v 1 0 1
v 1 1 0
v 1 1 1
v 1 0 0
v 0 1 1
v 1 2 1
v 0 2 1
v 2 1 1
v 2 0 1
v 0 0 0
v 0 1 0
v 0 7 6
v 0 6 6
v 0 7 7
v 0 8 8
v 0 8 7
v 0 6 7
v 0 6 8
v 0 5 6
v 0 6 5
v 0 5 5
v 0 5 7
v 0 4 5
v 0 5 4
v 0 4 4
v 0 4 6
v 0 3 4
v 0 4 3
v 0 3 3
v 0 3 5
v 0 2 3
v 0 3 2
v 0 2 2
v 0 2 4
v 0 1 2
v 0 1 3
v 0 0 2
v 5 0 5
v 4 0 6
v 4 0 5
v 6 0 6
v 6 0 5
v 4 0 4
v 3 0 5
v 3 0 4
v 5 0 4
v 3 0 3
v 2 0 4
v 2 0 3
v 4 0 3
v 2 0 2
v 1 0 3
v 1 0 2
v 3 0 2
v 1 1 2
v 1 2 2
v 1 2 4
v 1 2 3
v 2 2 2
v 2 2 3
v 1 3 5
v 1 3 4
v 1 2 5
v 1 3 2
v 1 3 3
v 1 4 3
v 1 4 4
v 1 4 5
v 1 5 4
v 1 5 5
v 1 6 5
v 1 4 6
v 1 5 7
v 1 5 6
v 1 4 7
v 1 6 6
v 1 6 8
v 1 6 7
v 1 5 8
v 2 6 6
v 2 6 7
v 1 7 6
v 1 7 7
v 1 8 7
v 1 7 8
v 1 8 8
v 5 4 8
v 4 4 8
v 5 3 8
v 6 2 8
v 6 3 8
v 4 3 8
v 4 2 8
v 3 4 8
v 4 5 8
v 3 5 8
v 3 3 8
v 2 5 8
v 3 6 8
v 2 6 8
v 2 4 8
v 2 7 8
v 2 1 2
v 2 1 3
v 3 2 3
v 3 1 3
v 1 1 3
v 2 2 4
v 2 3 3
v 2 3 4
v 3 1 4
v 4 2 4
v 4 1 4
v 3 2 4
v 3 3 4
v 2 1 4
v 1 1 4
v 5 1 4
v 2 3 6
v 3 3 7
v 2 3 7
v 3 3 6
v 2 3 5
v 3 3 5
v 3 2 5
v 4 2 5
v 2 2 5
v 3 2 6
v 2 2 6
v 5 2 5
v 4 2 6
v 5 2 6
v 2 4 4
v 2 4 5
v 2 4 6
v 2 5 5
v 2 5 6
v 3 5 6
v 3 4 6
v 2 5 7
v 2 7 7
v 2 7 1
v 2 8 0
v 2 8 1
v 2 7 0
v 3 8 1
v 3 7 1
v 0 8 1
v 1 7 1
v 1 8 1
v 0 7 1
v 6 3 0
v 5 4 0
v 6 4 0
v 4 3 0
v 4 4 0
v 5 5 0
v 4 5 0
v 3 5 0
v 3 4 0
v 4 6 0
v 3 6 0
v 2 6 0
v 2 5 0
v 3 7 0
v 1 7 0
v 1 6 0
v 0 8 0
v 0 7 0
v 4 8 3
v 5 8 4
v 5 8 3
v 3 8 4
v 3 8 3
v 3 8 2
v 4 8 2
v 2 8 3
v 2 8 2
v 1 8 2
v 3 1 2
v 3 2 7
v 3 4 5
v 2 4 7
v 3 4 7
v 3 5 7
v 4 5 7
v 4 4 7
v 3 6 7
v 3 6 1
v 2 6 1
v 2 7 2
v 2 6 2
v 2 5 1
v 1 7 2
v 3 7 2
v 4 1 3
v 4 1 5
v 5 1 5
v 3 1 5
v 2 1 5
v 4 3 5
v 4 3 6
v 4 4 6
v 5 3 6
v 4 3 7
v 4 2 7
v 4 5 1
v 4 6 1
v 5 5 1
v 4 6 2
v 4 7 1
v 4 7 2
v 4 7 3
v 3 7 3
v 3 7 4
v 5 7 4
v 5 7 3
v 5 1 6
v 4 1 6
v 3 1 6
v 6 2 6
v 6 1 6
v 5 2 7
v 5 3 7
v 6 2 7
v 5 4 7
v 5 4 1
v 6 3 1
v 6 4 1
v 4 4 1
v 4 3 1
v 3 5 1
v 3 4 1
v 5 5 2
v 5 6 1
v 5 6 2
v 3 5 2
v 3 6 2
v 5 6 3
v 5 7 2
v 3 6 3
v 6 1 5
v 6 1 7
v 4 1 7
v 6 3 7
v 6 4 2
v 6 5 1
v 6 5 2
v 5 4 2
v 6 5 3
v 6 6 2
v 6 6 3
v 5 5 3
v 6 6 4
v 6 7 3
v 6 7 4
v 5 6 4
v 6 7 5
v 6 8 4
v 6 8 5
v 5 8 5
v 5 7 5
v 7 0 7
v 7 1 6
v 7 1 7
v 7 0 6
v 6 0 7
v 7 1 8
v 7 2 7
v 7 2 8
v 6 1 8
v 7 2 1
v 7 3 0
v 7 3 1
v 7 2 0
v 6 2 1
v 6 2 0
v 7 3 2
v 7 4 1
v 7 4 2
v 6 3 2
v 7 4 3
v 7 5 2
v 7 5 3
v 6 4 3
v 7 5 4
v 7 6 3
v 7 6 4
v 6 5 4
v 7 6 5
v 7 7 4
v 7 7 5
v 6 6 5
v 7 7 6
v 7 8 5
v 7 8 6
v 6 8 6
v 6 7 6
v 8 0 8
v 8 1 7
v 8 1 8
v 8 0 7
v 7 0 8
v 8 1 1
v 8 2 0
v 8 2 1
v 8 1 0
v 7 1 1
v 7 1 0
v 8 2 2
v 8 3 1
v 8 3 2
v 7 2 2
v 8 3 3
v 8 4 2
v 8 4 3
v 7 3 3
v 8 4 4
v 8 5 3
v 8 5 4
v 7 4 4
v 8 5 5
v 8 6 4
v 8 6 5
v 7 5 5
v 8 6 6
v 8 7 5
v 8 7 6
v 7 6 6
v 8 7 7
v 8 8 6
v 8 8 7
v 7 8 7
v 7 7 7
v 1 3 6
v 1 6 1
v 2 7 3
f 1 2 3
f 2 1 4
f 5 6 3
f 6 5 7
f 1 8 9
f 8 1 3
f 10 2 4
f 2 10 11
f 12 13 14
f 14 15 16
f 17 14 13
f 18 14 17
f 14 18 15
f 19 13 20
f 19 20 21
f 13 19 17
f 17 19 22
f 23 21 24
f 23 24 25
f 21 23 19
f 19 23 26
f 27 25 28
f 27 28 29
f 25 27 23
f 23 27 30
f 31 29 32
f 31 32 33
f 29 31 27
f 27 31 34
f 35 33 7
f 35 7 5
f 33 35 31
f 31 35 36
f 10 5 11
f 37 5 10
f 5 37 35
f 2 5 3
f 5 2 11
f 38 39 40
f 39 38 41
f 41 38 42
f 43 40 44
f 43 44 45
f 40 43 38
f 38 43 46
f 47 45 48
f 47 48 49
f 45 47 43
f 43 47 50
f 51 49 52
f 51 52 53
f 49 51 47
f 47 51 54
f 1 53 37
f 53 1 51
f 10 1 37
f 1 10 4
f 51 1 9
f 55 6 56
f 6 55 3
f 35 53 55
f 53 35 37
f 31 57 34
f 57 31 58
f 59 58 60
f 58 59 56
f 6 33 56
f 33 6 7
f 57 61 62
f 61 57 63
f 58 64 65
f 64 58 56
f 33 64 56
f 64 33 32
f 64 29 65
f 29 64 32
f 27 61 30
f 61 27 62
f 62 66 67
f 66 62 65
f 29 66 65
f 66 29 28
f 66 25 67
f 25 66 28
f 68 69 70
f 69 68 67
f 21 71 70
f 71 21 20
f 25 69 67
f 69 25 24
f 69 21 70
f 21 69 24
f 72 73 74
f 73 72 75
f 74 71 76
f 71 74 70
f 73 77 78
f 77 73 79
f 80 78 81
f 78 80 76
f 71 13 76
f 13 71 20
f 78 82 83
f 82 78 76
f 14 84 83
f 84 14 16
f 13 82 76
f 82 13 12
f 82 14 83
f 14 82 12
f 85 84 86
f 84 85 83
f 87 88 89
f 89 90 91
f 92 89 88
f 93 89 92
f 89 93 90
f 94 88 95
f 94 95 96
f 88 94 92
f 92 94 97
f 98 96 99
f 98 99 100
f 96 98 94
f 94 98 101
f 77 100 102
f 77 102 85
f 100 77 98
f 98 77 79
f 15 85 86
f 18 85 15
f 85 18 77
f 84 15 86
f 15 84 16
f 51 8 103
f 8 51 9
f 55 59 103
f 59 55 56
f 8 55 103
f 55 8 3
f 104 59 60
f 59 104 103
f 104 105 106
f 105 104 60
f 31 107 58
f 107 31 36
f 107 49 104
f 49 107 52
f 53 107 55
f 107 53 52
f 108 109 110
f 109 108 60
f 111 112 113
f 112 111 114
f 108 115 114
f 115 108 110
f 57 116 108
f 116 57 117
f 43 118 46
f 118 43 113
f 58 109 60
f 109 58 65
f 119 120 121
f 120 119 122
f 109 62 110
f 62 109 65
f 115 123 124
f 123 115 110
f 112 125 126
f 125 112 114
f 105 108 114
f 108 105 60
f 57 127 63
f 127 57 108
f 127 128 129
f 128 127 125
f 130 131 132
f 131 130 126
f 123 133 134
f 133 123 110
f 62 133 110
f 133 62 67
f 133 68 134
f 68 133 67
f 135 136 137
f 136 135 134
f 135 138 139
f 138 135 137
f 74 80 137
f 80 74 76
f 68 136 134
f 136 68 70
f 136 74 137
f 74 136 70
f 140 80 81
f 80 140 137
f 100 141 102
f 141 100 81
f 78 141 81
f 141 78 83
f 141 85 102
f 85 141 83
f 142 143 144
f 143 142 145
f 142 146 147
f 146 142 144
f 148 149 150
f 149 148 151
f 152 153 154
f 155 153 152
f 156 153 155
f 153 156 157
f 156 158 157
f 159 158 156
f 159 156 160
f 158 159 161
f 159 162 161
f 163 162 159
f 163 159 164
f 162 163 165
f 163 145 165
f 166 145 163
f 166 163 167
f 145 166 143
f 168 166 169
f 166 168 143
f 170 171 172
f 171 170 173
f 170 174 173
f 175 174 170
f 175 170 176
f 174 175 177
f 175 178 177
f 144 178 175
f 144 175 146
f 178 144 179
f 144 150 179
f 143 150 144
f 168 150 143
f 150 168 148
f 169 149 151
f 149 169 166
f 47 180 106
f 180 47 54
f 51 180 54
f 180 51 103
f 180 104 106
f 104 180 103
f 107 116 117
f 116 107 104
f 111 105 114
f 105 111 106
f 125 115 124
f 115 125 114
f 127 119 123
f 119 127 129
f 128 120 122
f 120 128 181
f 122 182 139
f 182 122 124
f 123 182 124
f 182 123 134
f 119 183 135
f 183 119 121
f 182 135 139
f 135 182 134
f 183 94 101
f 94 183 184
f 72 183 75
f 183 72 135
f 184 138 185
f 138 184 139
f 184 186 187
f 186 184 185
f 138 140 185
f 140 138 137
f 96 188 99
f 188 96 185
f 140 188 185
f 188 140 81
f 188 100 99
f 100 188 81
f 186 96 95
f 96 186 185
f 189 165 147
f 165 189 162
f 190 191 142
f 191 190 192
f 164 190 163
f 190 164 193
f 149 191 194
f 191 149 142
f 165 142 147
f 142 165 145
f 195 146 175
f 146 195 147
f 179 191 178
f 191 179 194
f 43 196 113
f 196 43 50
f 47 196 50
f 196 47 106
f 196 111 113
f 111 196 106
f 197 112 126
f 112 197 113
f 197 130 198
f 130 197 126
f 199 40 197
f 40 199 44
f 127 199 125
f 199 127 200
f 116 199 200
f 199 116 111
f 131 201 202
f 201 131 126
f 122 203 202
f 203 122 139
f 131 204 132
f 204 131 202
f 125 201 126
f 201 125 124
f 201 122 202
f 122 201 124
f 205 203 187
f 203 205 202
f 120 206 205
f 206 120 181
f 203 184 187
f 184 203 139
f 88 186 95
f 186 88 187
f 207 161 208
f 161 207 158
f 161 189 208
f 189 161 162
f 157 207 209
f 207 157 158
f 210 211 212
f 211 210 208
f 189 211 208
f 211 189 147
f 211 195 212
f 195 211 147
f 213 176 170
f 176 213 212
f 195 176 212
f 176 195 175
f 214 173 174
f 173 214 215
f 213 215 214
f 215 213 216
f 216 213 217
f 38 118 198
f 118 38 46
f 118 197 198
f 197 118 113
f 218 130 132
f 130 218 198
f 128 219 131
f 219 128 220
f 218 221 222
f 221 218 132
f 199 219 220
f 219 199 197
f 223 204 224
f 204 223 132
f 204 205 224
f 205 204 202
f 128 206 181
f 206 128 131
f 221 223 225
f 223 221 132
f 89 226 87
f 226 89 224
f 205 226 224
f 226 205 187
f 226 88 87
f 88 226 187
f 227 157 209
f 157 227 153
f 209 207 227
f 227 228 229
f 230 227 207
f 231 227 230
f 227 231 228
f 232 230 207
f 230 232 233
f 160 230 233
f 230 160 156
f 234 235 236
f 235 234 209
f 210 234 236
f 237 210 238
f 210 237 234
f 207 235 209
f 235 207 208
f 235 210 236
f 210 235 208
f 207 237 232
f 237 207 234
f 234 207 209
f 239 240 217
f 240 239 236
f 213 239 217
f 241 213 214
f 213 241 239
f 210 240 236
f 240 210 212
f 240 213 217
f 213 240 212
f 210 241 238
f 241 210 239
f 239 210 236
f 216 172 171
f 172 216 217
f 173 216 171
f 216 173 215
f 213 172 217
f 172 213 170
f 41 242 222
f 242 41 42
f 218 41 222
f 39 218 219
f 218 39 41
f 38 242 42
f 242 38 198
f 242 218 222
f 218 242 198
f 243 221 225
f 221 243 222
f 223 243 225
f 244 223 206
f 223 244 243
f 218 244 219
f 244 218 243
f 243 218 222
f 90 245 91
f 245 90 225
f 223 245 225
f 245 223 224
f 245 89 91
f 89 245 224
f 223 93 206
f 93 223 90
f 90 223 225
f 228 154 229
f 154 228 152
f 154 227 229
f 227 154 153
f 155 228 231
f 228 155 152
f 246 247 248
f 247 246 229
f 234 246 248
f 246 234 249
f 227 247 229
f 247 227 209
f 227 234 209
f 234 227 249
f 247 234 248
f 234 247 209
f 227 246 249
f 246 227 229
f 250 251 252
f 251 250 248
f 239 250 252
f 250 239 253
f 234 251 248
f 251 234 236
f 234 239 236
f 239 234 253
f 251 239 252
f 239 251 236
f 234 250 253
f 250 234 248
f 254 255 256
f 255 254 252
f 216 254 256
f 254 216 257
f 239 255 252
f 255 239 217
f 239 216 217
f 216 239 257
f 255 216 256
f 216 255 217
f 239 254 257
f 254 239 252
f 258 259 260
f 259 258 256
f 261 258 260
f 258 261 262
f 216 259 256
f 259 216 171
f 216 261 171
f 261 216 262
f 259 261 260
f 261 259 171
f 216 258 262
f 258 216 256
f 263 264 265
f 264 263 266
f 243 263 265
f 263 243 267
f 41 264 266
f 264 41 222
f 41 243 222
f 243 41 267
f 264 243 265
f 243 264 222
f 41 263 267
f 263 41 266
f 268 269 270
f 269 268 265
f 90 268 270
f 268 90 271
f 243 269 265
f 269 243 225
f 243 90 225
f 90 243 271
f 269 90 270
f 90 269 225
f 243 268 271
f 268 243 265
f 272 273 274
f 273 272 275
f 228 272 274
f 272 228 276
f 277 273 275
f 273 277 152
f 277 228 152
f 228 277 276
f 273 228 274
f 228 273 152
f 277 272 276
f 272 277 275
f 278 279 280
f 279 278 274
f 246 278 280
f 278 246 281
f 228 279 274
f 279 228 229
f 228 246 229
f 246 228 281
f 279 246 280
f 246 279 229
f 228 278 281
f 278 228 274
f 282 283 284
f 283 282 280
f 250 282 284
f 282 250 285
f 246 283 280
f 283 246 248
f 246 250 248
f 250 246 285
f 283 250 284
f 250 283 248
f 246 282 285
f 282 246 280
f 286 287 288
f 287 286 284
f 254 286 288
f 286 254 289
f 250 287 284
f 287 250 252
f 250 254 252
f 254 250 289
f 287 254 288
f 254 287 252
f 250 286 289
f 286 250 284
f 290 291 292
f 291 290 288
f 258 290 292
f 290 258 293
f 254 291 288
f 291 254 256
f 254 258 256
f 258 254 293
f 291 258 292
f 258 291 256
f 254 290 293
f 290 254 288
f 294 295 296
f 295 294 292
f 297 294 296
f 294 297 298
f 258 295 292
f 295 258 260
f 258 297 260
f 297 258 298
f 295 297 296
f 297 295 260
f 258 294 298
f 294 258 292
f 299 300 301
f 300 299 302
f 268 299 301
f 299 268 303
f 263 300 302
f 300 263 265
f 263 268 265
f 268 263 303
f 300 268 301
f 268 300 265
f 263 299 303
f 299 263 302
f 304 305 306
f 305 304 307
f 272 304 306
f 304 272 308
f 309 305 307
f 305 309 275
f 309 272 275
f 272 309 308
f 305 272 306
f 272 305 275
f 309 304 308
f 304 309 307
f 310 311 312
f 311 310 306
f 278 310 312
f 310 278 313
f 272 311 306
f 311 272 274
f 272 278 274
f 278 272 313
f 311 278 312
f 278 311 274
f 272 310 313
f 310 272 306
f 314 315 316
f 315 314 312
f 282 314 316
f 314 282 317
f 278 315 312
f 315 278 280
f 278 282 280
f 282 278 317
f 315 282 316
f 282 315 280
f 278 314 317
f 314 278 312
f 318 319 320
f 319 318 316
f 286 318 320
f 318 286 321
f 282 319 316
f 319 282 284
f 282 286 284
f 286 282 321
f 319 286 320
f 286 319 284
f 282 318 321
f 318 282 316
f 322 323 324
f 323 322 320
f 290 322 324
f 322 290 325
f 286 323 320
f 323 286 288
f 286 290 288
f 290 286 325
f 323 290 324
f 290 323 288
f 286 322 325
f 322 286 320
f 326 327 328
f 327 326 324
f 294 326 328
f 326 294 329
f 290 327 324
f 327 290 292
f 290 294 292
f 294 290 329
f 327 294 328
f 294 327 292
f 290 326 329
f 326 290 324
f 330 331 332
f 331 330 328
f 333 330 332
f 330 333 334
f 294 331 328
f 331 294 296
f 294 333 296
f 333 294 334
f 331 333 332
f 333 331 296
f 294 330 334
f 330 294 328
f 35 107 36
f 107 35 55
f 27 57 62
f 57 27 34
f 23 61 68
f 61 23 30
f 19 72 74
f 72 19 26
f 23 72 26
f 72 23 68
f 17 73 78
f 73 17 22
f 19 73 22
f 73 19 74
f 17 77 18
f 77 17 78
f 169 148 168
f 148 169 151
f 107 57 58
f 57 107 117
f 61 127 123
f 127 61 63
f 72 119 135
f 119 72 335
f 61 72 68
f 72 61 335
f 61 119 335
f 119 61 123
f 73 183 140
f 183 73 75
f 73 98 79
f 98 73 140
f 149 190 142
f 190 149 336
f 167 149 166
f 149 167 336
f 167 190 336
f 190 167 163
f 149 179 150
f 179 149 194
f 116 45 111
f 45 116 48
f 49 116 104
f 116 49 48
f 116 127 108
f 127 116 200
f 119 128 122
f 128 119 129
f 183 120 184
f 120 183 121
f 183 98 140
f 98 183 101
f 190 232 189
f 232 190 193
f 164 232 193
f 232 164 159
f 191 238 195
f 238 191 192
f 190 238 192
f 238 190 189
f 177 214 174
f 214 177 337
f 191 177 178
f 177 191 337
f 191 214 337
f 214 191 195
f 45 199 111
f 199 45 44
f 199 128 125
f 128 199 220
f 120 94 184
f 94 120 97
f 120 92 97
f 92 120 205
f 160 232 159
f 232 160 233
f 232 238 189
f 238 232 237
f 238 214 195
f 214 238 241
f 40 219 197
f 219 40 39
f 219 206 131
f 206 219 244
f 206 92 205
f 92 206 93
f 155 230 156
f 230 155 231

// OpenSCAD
union() {
    translate([0, 0, 0]) cube([1, 1, 1]);
    translate([0, 1, 1]) cube([1, 1, 1]);
    translate([0, 2, 2]) cube([1, 1, 1]);
    translate([0, 3, 3]) cube([1, 1, 1]);
    translate([0, 4, 4]) cube([1, 1, 1]);
    translate([0, 5, 5]) cube([1, 1, 1]);
    translate([0, 6, 6]) cube([1, 1, 1]);
    translate([0, 7, 7]) cube([1, 1, 1]);
    translate([1, 0, 1]) cube([1, 1, 1]);
    translate([1, 1, 2]) cube([1, 1, 1]);
    translate([1, 2, 3]) cube([1, 1, 1]);
    translate([1, 3, 4]) cube([1, 1, 1]);
    translate([1, 4, 5]) cube([1, 1, 1]);
    translate([1, 5, 6]) cube([1, 1, 1]);
    translate([1, 6, 7]) cube([1, 1, 1]);
    translate([1, 7, 0]) cube([1, 1, 1]);
    translate([2, 0, 2]) cube([1, 1, 1]);
    translate([2, 1, 3]) cube([1, 1, 1]);
    translate([2, 2, 4]) cube([1, 1, 1]);
    translate([2, 3, 5]) cube([1, 1, 1]);
    translate([2, 4, 6]) cube([1, 1, 1]);
    translate([2, 5, 7]) cube([1, 1, 1]);
    translate([2, 6, 0]) cube([1, 1, 1]);
    translate([2, 7, 1]) cube([1, 1, 1]);
    translate([3, 0, 3]) cube([1, 1, 1]);
    translate([3, 1, 4]) cube([1, 1, 1]);
    translate([3, 2, 5]) cube([1, 1, 1]);
    translate([3, 3, 6]) cube([1, 1, 1]);
    translate([3, 4, 7]) cube([1, 1, 1]);
    translate([3, 5, 0]) cube([1, 1, 1]);
    translate([3, 6, 1]) cube([1, 1, 1]);
    translate([3, 7, 2]) cube([1, 1, 1]);
    translate([4, 0, 4]) cube([1, 1, 1]);
    translate([4, 1, 5]) cube([1, 1, 1]);
    translate([4, 2, 6]) cube([1, 1, 1]);
    translate([4, 3, 7]) cube([1, 1, 1]);
    translate([4, 4, 0]) cube([1, 1, 1]);
    translate([4, 5, 1]) cube([1, 1, 1]);
    translate([4, 6, 2]) cube([1, 1, 1]);
    translate([4, 7, 3]) cube([1, 1, 1]);
    translate([5, 0, 5]) cube([1, 1, 1]);
    translate([5, 1, 6]) cube([1, 1, 1]);
    translate([5, 2, 7]) cube([1, 1, 1]);
    translate([5, 3, 0]) cube([1, 1, 1]);
    translate([5, 4, 1]) cube([1, 1, 1]);
    translate([5, 5, 2]) cube([1, 1, 1]);
    translate([5, 6, 3]) cube([1, 1, 1]);
    translate([5, 7, 4]) cube([1, 1, 1]);
    translate([6, 0, 6]) cube([1, 1, 1]);
    translate([6, 1, 7]) cube([1, 1, 1]);
    translate([6, 2, 0]) cube([1, 1, 1]);
    translate([6, 3, 1]) cube([1, 1, 1]);
    translate([6, 4, 2]) cube([1, 1, 1]);
    translate([6, 5, 3]) cube([1, 1, 1]);
    translate([6, 6, 4]) cube([1, 1, 1]);
    translate([6, 7, 5]) cube([1, 1, 1]);
    translate([7, 0, 7]) cube([1, 1, 1]);
    translate([7, 1, 0]) cube([1, 1, 1]);
    translate([7, 2, 1]) cube([1, 1, 1]);
    translate([7, 3, 2]) cube([1, 1, 1]);
    translate([7, 4, 3]) cube([1, 1, 1]);
    translate([7, 5, 4]) cube([1, 1, 1]);
    translate([7, 6, 5]) cube([1, 1, 1]);
    translate([7, 7, 6]) cube([1, 1, 1]);
    translate([0, 0, 1]) cube([1, 1, 1]);
    translate([0, 1, 2]) cube([1, 1, 1]);
    translate([0, 2, 3]) cube([1, 1, 1]);
    translate([0, 3, 4]) cube([1, 1, 1]);
    translate([0, 4, 5]) cube([1, 1, 1]);
    translate([0, 5, 6]) cube([1, 1, 1]);
    translate([0, 6, 7]) cube([1, 1, 1]);
    translate([0, 7, 0]) cube([1, 1, 1]);
    translate([1, 0, 2]) cube([1, 1, 1]);
    translate([1, 1, 3]) cube([1, 1, 1]);
    translate([1, 2, 4]) cube([1, 1, 1]);
    translate([1, 3, 5]) cube([1, 1, 1]);
    translate([1, 4, 6]) cube([1, 1, 1]);
    translate([1, 5, 7]) cube([1, 1, 1]);
    translate([1, 6, 0]) cube([1, 1, 1]);
    translate([1, 7, 1]) cube([1, 1, 1]);
    translate([2, 0, 3]) cube([1, 1, 1]);
    translate([2, 1, 4]) cube([1, 1, 1]);
    translate([2, 2, 5]) cube([1, 1, 1]);
    translate([2, 3, 6]) cube([1, 1, 1]);
    translate([2, 4, 7]) cube([1, 1, 1]);
    translate([2, 5, 0]) cube([1, 1, 1]);
    translate([2, 6, 1]) cube([1, 1, 1]);
    translate([2, 7, 2]) cube([1, 1, 1]);
    translate([3, 0, 4]) cube([1, 1, 1]);
    translate([3, 1, 5]) cube([1, 1, 1]);
    translate([3, 2, 6]) cube([1, 1, 1]);
    translate([3, 3, 7]) cube([1, 1, 1]);
    translate([3, 4, 0]) cube([1, 1, 1]);
    translate([3, 5, 1]) cube([1, 1, 1]);
    translate([3, 6, 2]) cube([1, 1, 1]);
    translate([3, 7, 3]) cube([1, 1, 1]);
    translate([4, 0, 5]) cube([1, 1, 1]);
    translate([4, 1, 6]) cube([1, 1, 1]);
    translate([4, 2, 7]) cube([1, 1, 1]);
    translate([4, 3, 0]) cube([1, 1, 1]);
}
